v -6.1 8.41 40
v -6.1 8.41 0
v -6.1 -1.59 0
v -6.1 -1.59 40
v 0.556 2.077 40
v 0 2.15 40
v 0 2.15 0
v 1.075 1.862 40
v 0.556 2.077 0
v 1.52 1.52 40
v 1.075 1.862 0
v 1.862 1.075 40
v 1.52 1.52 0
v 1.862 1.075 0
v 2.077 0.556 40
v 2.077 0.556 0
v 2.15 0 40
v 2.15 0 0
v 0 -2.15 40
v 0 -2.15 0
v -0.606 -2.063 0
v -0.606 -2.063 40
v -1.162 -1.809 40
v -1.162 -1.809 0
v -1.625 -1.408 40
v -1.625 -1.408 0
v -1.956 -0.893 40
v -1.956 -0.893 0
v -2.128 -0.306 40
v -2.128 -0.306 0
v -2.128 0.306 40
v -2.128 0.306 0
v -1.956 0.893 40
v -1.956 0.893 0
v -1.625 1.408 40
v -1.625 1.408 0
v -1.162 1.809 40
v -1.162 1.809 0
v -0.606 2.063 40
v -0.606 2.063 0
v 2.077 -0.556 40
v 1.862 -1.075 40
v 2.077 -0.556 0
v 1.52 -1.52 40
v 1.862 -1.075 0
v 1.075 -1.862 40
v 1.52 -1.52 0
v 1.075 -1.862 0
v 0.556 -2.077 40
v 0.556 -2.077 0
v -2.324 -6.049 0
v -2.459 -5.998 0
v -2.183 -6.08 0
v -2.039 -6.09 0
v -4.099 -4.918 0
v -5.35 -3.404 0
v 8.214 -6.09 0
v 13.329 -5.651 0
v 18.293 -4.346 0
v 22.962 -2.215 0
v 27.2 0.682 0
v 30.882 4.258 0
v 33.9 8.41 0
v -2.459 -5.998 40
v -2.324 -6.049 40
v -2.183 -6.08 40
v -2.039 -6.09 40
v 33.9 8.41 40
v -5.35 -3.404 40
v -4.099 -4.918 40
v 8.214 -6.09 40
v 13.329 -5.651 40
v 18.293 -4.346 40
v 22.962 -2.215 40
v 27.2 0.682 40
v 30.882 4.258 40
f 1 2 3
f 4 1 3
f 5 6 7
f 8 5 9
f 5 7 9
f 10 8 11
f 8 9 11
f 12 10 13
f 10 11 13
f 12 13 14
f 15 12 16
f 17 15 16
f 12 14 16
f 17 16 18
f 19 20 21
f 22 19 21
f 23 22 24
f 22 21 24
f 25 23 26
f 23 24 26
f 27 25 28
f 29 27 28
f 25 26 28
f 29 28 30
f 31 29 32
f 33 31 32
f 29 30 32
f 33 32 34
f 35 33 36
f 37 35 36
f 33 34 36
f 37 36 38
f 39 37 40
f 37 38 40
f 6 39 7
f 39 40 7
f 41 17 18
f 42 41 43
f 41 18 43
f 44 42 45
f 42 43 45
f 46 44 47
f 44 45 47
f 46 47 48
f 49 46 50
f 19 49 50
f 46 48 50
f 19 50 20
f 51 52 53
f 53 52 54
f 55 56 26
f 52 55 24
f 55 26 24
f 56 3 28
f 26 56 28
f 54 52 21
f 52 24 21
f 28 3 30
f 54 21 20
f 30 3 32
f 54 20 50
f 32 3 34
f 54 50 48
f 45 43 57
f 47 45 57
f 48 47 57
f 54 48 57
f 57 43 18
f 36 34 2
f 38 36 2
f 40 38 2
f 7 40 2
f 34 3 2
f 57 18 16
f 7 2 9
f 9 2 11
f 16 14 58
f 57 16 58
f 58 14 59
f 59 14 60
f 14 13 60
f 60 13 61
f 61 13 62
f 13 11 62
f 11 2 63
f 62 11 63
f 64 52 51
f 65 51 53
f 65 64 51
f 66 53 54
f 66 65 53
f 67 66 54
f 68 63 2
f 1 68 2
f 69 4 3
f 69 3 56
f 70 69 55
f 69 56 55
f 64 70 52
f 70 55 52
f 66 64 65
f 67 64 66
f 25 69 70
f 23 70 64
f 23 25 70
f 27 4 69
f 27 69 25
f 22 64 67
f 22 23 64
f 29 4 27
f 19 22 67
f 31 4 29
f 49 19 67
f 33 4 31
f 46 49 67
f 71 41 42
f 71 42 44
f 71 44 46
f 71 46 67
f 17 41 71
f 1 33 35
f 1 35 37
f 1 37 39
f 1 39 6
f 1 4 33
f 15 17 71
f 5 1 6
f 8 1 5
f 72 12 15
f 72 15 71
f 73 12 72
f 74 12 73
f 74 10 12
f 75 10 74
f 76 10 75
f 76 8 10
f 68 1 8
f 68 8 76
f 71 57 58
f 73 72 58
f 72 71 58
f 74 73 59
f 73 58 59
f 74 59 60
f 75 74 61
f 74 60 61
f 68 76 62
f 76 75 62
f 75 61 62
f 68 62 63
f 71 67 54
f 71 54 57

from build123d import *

# Parameters (mm, degrees)
F1_DEPTH    = 40
F2_R        = 1
F3_T1_DEPTH = 168.4279953904


# Not quite as in the source:
# - a fillet or chamfer that OpenCascade refuses, or shapes differently, is made with other operations: its cross-section is extruded or revolved along the edge and cut away or added


with BuildPart() as f1:
    # F0 (on Top) → F1 (new body)
    with BuildSketch(Plane.XY):
        with BuildLine():
            Line((0, 2.15), (0, 8.41))
            Line((0, 8.41), (-6.1, 8.41))
            Line((-6.1, 8.41), (-6.1, -1.59))
            ThreePointArc((-6.1, -1.59), (-4.7073896383, -4.2954889128), (-2.25, -6.09))
            Line((-2.25, -6.09), (0, -6.09))
            Line((0, -6.09), (0, -2.15))
            ThreePointArc((0, -2.15), (-2.15, 0), (0, 2.15))
        make_face()
        with BuildLine():
            Line((6.1, -1.59), (6.1, 8.41))
            Line((6.1, 8.41), (0, 8.41))
            Line((0, 8.41), (0, 2.15))
            ThreePointArc((0, 2.15), (1.5202795796, 1.5202795796), (2.15, 0))
            ThreePointArc((2.15, 0), (1.5202795796, -1.5202795796), (0, -2.15))
            Line((0, -2.15), (0, -6.09))
            Line((0, -6.09), (2.25, -6.09))
            ThreePointArc((2.25, -6.09), (4.7073896383, -4.2954889128), (6.1, -1.59))
        make_face()
        with BuildLine():
            Line((33.9, 8.41), (6.1, 8.41))
            Line((6.1, 8.41), (6.1, -1.59))
            ThreePointArc((6.1, -1.59), (4.7073896383, -4.2954889128), (2.25, -6.09))
            Line((2.25, -6.09), (33.9, -6.09))
            Line((33.9, -6.09), (33.9, 8.41))
        make_face()
    extrude(amount=F1_DEPTH)

    # F2
    f2_edges = [f1.edges().sort_by_distance(p)[0] for p in [
        (-2.25, -6.09, 20),
    ]]
    fillet(f2_edges, radius=F2_R)

    # F3: fillet of radius 30 on 1 edges, made by hand

    # F3_s2 → F3_t1 (cut)
    with BuildSketch(Plane.XY.offset(-64.2139976952)):
        with BuildLine():
            ThreePointArc((8.2144009219, -6.09), (22.9622821257, -2.2147009552), (33.9, 8.41))
            Line((33.9, 8.41), (33.9, -6.09))
            Line((33.9, -6.09), (8.2144009219, -6.09))
        make_face()
    extrude(amount=F3_T1_DEPTH, mode=Mode.SUBTRACT)


solid = f1.part
